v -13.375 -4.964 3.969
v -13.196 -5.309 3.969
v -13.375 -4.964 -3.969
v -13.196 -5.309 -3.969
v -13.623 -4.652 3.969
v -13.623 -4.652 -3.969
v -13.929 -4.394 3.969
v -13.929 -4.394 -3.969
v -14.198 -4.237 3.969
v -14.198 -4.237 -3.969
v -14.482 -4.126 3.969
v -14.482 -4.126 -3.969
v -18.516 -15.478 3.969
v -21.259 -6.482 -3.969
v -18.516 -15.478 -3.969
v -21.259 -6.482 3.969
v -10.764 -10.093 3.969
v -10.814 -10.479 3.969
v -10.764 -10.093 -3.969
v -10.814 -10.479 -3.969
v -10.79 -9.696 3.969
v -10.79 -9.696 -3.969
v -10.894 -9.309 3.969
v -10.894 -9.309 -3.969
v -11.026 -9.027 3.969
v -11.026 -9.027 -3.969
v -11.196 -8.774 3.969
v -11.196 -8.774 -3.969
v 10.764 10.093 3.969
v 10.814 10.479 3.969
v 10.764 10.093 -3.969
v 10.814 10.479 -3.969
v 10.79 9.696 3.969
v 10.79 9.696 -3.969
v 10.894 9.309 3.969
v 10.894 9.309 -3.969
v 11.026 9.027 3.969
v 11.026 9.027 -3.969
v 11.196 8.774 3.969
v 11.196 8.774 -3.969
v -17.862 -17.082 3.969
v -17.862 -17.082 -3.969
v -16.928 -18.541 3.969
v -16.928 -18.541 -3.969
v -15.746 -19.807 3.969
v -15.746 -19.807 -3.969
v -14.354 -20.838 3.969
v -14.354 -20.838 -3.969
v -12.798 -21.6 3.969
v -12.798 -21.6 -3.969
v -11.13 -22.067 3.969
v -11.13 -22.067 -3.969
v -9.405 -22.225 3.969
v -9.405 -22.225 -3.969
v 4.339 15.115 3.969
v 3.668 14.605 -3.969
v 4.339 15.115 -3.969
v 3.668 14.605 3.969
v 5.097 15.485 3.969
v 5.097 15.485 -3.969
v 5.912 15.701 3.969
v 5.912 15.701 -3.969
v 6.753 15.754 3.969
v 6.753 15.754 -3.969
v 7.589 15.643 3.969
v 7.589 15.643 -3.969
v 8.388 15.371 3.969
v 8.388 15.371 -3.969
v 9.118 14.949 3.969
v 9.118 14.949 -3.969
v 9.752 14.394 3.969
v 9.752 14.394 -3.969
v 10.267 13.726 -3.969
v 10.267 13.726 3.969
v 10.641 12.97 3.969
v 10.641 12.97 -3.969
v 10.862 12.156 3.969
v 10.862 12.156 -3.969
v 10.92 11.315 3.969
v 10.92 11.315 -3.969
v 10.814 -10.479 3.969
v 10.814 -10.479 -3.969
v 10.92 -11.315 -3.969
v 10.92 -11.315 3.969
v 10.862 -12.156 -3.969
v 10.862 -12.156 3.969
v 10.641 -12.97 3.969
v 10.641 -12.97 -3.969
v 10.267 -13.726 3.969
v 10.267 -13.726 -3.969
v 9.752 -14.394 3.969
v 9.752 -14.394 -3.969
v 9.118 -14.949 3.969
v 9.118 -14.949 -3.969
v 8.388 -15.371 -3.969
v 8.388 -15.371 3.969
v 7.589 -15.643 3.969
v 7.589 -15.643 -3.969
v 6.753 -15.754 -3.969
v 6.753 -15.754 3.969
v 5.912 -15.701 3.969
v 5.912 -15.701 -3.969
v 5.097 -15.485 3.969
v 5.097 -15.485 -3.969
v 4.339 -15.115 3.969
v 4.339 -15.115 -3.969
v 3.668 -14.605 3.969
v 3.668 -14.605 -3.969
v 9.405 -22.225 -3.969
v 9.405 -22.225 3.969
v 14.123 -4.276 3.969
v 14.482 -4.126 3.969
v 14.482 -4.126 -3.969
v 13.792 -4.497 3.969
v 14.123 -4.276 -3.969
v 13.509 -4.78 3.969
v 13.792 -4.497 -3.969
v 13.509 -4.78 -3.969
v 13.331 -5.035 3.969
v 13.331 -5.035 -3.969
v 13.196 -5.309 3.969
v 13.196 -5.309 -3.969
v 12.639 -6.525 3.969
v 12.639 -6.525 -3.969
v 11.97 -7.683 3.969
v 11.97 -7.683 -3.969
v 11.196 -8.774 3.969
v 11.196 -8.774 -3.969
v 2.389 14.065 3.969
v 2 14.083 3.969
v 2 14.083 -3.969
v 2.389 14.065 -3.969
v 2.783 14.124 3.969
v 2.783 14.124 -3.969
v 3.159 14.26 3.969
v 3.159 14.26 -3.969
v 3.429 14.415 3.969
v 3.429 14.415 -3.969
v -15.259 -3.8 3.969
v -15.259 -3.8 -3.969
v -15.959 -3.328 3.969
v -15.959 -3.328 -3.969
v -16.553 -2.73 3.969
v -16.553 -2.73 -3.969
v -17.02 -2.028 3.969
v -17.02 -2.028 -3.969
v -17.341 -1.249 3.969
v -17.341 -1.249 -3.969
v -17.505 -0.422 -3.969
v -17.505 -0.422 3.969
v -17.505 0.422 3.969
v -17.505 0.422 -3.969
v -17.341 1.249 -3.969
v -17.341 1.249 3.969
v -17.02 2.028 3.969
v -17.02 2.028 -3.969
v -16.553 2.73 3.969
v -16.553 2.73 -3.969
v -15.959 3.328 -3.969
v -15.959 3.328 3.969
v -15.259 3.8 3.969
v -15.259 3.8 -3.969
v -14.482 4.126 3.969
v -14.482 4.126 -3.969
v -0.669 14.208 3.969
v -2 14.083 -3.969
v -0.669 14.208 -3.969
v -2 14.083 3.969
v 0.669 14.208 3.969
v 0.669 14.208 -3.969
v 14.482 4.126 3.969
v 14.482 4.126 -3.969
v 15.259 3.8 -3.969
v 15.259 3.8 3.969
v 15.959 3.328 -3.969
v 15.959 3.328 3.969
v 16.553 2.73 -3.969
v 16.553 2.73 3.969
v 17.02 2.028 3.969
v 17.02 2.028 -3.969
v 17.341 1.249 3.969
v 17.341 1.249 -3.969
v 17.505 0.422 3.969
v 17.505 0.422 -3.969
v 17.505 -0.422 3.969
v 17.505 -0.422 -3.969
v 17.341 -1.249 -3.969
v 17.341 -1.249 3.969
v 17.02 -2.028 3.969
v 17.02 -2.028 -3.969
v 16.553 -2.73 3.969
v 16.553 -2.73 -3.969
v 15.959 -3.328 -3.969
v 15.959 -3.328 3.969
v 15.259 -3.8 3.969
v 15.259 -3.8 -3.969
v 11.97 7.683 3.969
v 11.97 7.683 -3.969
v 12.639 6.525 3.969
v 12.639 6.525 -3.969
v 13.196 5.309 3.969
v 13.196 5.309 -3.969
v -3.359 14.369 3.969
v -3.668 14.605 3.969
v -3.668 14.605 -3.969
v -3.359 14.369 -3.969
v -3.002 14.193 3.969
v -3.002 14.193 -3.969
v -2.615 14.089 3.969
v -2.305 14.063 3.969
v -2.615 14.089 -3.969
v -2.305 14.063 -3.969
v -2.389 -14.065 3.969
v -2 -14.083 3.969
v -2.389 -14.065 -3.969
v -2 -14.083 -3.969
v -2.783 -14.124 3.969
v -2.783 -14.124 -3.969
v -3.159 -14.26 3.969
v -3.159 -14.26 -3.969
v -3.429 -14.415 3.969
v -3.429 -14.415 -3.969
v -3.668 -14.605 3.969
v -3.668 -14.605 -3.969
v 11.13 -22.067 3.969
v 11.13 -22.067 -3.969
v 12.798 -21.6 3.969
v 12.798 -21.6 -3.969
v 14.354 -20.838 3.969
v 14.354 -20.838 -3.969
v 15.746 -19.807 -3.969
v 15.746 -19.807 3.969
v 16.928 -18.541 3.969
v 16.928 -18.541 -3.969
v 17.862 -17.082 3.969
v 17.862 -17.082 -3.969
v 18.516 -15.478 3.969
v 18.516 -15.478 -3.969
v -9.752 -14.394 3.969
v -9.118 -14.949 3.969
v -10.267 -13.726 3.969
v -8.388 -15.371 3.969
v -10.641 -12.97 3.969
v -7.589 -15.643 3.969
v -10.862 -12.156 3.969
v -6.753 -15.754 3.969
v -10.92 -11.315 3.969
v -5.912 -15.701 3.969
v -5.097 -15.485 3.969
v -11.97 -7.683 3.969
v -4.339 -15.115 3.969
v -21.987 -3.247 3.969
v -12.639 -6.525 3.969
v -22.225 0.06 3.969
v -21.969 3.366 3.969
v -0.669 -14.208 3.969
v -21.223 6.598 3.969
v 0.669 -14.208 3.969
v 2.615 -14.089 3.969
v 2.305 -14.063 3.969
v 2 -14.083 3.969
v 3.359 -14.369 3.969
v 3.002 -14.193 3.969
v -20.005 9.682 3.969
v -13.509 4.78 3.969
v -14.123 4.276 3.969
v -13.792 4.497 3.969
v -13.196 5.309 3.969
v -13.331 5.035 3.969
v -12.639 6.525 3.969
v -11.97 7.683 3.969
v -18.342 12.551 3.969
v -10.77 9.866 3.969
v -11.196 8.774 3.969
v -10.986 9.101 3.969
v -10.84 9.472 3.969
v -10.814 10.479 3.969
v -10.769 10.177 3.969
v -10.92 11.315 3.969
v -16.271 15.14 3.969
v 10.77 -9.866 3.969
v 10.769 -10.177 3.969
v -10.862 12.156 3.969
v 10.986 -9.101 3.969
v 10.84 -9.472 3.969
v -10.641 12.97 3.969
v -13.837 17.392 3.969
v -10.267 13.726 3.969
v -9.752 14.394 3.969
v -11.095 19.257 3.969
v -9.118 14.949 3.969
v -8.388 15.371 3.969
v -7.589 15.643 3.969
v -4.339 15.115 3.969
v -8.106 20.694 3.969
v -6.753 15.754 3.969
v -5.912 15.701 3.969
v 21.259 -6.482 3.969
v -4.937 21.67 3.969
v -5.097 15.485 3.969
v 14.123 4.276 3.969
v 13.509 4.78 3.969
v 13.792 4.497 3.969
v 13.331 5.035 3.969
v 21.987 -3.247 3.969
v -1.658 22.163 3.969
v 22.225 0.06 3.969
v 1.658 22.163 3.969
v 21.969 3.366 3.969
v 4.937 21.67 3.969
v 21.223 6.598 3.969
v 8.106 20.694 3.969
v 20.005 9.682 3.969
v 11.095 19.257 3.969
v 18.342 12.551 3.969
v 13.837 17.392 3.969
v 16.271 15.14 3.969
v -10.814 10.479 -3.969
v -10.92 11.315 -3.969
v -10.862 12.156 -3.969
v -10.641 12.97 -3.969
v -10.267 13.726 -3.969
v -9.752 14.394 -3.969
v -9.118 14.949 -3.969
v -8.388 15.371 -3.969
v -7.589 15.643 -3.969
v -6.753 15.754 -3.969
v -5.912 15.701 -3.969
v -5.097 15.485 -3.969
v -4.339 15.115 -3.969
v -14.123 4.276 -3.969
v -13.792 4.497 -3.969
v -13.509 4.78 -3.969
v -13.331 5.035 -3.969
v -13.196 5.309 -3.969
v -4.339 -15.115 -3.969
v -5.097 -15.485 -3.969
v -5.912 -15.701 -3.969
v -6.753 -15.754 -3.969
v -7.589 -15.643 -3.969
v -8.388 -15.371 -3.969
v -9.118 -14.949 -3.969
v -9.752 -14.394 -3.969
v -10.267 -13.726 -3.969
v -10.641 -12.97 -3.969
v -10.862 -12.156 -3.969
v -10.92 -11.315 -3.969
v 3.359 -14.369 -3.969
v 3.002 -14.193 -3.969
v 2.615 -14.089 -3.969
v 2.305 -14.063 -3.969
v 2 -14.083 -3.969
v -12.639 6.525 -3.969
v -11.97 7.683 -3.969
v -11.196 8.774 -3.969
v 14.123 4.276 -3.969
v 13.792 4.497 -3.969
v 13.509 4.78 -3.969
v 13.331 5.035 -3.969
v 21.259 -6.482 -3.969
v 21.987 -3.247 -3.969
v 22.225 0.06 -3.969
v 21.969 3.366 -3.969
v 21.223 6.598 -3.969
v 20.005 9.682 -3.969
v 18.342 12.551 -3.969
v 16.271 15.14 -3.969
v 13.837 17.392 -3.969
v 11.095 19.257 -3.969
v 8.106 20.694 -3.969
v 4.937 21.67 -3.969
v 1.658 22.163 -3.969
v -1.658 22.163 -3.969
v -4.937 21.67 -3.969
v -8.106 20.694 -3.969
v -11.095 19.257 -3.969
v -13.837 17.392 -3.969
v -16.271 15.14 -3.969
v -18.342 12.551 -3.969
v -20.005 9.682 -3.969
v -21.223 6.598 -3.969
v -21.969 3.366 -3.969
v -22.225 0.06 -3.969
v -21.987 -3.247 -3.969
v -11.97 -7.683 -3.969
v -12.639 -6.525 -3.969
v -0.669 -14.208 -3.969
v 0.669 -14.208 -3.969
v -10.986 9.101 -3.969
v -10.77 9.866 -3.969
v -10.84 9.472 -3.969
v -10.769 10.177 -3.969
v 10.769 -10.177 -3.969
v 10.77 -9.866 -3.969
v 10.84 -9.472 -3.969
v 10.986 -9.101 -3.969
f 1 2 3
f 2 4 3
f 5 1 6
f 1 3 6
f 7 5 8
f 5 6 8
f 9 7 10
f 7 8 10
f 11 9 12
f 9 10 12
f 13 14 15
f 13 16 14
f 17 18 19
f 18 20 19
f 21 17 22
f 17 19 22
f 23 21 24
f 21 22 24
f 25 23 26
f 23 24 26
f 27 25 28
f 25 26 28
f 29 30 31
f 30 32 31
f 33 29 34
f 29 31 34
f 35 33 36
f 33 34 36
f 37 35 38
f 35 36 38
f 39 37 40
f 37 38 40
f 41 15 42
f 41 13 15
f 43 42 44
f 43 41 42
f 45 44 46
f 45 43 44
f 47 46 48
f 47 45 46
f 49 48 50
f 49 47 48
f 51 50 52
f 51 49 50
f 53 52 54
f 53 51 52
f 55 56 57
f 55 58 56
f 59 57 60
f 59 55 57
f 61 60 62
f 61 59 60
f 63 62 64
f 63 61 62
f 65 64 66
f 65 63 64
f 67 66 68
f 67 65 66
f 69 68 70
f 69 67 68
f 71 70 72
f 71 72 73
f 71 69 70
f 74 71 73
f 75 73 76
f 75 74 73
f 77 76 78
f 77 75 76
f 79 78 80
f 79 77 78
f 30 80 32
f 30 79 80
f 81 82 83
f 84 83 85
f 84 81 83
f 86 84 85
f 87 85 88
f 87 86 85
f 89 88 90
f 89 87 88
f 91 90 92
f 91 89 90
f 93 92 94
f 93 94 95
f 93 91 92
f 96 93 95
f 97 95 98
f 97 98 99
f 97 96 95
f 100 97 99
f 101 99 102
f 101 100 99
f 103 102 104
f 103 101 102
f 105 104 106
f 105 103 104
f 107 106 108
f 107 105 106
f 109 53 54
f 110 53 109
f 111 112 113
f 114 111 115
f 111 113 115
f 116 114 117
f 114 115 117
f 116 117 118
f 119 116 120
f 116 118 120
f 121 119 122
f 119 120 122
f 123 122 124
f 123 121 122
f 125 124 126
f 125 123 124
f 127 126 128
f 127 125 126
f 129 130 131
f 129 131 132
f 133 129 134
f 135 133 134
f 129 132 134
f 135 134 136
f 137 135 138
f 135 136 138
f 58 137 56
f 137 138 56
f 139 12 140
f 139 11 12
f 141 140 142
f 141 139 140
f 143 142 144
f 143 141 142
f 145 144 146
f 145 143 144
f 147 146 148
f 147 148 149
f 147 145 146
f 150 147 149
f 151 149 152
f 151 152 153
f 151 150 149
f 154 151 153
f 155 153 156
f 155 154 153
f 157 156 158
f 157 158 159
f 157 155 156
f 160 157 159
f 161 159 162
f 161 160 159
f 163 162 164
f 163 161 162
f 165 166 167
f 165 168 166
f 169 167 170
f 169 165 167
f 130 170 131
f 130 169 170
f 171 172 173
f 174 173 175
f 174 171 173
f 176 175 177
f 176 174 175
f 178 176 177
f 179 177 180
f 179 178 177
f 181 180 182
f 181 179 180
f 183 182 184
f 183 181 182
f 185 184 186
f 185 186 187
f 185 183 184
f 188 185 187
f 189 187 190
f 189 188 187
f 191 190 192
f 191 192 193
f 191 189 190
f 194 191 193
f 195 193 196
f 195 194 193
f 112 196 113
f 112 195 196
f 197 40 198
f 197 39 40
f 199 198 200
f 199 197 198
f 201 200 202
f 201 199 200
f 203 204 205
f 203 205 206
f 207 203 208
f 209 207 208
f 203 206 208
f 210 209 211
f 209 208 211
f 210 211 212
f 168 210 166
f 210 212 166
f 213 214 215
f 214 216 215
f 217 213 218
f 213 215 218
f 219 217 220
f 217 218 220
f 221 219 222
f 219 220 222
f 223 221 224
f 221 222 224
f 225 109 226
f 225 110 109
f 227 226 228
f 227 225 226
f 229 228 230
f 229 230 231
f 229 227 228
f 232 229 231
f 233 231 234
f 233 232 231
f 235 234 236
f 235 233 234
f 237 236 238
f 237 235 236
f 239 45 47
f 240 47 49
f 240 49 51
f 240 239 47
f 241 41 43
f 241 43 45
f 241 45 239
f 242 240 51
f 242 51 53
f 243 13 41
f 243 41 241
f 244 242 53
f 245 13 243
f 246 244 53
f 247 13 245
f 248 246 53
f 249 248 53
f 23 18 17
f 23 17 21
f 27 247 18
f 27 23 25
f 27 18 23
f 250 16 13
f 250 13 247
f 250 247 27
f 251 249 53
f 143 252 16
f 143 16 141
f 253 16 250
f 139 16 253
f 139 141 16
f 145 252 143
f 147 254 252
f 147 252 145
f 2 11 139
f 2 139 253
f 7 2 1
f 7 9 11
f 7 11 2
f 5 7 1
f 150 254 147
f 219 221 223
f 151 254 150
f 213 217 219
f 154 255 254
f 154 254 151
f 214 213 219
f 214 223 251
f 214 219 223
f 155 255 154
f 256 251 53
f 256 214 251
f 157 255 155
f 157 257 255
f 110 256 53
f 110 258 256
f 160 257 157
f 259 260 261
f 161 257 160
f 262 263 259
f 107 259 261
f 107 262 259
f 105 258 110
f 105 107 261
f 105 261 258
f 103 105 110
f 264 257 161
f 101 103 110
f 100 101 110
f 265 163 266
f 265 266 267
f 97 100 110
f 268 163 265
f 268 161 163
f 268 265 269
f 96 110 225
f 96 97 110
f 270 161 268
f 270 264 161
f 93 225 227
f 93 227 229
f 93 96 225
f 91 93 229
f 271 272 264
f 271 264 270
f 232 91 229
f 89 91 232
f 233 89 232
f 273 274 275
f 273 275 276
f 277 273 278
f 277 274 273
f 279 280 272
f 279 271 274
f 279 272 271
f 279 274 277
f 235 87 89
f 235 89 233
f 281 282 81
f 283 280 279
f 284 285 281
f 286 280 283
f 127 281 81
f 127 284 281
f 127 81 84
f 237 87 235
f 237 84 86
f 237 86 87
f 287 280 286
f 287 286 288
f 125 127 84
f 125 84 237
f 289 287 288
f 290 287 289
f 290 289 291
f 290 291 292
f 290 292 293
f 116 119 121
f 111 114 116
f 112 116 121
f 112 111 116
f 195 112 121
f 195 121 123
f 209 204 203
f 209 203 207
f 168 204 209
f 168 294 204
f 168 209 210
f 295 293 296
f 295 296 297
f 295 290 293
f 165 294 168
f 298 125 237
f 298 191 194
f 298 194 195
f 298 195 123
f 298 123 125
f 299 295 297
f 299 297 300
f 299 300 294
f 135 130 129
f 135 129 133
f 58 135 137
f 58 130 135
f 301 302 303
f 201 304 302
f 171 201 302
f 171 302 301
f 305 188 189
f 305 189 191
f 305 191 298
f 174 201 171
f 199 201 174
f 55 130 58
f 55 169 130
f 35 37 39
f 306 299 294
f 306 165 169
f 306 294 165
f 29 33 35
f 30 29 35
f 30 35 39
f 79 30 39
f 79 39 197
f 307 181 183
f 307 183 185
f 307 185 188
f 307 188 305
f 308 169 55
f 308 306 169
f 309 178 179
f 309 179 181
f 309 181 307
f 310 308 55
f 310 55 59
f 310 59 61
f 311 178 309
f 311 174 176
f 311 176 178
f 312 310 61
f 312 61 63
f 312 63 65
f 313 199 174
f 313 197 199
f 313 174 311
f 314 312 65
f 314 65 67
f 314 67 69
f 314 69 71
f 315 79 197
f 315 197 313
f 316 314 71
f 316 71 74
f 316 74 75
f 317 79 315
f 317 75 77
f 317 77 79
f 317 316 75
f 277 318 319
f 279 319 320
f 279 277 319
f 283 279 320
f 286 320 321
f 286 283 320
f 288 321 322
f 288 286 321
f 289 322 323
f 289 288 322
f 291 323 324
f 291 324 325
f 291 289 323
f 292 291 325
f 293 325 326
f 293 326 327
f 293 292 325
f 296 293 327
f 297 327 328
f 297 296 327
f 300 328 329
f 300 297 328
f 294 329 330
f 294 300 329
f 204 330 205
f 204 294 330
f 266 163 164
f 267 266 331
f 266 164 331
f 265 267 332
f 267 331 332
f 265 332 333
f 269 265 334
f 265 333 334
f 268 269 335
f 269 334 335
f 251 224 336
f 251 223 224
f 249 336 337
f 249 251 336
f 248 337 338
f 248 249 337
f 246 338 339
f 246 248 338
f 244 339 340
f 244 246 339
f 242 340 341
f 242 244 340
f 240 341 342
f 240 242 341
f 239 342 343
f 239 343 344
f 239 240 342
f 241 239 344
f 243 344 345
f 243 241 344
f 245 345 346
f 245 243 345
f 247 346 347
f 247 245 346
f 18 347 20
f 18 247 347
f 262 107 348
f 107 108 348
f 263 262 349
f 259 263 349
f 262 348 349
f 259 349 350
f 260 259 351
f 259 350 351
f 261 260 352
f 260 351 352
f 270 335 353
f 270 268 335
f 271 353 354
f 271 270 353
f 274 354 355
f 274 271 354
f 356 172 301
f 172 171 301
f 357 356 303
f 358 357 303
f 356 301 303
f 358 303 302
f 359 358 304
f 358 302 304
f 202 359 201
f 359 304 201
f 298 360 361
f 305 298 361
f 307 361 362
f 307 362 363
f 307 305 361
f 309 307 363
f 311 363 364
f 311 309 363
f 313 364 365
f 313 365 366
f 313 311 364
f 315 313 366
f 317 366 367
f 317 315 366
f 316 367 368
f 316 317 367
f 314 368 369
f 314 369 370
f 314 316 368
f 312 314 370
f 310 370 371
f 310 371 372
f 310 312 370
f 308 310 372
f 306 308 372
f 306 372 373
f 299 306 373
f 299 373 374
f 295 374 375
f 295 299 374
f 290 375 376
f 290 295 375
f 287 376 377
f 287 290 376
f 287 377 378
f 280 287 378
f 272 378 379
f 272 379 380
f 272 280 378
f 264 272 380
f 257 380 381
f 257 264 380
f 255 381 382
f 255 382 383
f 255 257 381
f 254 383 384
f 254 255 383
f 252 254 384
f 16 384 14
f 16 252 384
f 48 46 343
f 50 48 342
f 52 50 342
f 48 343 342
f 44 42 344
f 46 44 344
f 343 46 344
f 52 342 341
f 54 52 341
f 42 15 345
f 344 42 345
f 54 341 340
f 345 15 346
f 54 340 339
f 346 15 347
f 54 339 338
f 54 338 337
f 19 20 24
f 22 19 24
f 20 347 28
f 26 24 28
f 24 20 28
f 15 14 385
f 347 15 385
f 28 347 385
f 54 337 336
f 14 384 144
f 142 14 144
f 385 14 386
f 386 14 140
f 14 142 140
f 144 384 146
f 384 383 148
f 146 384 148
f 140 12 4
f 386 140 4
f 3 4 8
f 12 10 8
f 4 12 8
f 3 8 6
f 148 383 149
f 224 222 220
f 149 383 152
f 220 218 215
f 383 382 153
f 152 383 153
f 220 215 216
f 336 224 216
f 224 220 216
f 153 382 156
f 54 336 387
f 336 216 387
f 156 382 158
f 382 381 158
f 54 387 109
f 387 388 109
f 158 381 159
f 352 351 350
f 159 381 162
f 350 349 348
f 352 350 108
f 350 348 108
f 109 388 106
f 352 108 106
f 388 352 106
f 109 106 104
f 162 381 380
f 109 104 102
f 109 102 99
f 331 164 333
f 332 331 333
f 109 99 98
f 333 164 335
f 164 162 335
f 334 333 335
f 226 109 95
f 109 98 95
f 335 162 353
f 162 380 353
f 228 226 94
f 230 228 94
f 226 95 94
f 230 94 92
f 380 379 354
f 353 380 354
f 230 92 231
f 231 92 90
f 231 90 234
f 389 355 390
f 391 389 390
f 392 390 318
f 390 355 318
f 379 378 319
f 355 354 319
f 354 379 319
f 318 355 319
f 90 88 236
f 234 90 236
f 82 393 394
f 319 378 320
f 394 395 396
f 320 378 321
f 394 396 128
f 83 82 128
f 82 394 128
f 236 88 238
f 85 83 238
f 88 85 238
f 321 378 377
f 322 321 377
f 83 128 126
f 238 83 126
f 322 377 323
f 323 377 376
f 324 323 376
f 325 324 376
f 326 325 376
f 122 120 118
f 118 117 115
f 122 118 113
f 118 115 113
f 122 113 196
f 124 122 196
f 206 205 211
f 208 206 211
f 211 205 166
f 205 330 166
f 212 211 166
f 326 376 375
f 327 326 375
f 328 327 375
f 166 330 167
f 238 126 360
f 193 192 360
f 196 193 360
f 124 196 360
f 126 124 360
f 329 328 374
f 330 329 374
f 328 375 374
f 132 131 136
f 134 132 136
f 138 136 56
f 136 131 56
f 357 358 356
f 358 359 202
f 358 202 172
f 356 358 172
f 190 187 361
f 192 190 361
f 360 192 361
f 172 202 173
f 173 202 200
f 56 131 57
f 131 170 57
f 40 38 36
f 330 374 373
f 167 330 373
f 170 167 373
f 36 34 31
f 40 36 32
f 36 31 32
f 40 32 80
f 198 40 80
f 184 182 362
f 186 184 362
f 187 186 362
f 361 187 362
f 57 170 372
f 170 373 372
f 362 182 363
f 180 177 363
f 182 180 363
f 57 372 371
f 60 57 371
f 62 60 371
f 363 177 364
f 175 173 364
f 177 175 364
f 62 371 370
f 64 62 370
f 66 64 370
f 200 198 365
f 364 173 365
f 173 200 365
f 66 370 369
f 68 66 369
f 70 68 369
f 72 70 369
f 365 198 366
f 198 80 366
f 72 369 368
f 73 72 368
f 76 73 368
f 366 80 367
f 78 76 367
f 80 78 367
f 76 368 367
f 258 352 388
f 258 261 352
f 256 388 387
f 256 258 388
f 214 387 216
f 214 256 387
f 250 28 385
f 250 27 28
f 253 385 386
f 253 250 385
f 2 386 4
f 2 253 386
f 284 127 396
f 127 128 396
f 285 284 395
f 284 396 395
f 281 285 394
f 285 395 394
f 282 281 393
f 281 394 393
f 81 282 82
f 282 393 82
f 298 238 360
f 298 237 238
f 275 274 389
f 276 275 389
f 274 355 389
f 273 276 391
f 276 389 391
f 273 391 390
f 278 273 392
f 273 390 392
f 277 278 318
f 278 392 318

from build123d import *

# Parameters (mm, degrees)
BOSS_EXTRUDE1_DEPTH = 3.96875
FILLET2_R           = 2.032
FILLET3_R           = 9.525


with BuildPart() as part:
    # Sketch1 → Boss-Extrude1 (new, symmetric)
    with BuildSketch(Plane.XY):
        with BuildLine():
            Line((-21.258657525, -6.482291667), (-16.458315503, -22.225))
            Line((-16.458315503, -22.225), (16.458315503, -22.225))
            Line((16.458315503, -22.225), (21.258657525, -6.482291667))
            ThreePointArc((21.258657525, -6.482291667), (0, 22.225), (-21.258657525, -6.482291667))
        make_face()
        with BuildLine():
            ThreePointArc((13.55725, 4.303852743), (17.526, 0), (13.55725, -4.303852743))
            ThreePointArc((13.55725, -4.303852743), (12.318345343, -7.112), (10.50587081, -9.588996534))
            ThreePointArc((10.50587081, -9.588996534), (8.763, -15.177961227), (3.05137919, -13.892849277))
            ThreePointArc((3.05137919, -13.892849277), (0, -14.224), (-3.05137919, -13.892849277))
            ThreePointArc((-3.05137919, -13.892849277), (-8.763, -15.177961227), (-10.50587081, -9.588996534))
            ThreePointArc((-10.50587081, -9.588996534), (-12.318345343, -7.112), (-13.55725, -4.303852743))
            ThreePointArc((-13.55725, -4.303852743), (-17.526, 0), (-13.55725, 4.303852743))
            ThreePointArc((-13.55725, 4.303852743), (-12.318345343, 7.112), (-10.50587081, 9.588996534))
            ThreePointArc((-10.50587081, 9.588996534), (-8.763, 15.177961227), (-3.05137919, 13.892849277))
            ThreePointArc((-3.05137919, 13.892849277), (0, 14.224), (3.05137919, 13.892849277))
            ThreePointArc((3.05137919, 13.892849277), (8.763, 15.177961227), (10.50587081, 9.588996534))
            ThreePointArc((10.50587081, 9.588996534), (12.318345343, 7.112), (13.55725, 4.303852743))
        make_face(mode=Mode.SUBTRACT)
    extrude(amount=BOSS_EXTRUDE1_DEPTH, both=True)

    # Fillet2
    fillet2_edges = [part.edges().sort_by_distance(p)[0] for p in [
        (-13.55725, -4.303852743, 0),
        (-10.50587081, -9.588996534, 0),
        (-3.05137919, -13.892849277, 0),
        (3.05137919, -13.892849277, 0),
        (10.50587081, -9.588996534, 0),
        (13.55725, -4.303852743, 0),
        (13.55725, 4.303852743, 0),
        (10.50587081, 9.588996534, 0),
        (3.05137919, 13.892849277, 0),
        (-3.05137919, 13.892849277, 0),
        (-10.50587081, 9.588996534, 0),
        (-13.55725, 4.303852743, 0),
    ]]
    fillet(fillet2_edges, radius=FILLET2_R)

    # Fillet3
    fillet3_edges = [part.edges().sort_by_distance(p)[0] for p in [
        (16.458315503, -22.225, 0),
        (-16.458315503, -22.225, 0),
    ]]
    fillet(fillet3_edges, radius=FILLET3_R)


solid = part.part
